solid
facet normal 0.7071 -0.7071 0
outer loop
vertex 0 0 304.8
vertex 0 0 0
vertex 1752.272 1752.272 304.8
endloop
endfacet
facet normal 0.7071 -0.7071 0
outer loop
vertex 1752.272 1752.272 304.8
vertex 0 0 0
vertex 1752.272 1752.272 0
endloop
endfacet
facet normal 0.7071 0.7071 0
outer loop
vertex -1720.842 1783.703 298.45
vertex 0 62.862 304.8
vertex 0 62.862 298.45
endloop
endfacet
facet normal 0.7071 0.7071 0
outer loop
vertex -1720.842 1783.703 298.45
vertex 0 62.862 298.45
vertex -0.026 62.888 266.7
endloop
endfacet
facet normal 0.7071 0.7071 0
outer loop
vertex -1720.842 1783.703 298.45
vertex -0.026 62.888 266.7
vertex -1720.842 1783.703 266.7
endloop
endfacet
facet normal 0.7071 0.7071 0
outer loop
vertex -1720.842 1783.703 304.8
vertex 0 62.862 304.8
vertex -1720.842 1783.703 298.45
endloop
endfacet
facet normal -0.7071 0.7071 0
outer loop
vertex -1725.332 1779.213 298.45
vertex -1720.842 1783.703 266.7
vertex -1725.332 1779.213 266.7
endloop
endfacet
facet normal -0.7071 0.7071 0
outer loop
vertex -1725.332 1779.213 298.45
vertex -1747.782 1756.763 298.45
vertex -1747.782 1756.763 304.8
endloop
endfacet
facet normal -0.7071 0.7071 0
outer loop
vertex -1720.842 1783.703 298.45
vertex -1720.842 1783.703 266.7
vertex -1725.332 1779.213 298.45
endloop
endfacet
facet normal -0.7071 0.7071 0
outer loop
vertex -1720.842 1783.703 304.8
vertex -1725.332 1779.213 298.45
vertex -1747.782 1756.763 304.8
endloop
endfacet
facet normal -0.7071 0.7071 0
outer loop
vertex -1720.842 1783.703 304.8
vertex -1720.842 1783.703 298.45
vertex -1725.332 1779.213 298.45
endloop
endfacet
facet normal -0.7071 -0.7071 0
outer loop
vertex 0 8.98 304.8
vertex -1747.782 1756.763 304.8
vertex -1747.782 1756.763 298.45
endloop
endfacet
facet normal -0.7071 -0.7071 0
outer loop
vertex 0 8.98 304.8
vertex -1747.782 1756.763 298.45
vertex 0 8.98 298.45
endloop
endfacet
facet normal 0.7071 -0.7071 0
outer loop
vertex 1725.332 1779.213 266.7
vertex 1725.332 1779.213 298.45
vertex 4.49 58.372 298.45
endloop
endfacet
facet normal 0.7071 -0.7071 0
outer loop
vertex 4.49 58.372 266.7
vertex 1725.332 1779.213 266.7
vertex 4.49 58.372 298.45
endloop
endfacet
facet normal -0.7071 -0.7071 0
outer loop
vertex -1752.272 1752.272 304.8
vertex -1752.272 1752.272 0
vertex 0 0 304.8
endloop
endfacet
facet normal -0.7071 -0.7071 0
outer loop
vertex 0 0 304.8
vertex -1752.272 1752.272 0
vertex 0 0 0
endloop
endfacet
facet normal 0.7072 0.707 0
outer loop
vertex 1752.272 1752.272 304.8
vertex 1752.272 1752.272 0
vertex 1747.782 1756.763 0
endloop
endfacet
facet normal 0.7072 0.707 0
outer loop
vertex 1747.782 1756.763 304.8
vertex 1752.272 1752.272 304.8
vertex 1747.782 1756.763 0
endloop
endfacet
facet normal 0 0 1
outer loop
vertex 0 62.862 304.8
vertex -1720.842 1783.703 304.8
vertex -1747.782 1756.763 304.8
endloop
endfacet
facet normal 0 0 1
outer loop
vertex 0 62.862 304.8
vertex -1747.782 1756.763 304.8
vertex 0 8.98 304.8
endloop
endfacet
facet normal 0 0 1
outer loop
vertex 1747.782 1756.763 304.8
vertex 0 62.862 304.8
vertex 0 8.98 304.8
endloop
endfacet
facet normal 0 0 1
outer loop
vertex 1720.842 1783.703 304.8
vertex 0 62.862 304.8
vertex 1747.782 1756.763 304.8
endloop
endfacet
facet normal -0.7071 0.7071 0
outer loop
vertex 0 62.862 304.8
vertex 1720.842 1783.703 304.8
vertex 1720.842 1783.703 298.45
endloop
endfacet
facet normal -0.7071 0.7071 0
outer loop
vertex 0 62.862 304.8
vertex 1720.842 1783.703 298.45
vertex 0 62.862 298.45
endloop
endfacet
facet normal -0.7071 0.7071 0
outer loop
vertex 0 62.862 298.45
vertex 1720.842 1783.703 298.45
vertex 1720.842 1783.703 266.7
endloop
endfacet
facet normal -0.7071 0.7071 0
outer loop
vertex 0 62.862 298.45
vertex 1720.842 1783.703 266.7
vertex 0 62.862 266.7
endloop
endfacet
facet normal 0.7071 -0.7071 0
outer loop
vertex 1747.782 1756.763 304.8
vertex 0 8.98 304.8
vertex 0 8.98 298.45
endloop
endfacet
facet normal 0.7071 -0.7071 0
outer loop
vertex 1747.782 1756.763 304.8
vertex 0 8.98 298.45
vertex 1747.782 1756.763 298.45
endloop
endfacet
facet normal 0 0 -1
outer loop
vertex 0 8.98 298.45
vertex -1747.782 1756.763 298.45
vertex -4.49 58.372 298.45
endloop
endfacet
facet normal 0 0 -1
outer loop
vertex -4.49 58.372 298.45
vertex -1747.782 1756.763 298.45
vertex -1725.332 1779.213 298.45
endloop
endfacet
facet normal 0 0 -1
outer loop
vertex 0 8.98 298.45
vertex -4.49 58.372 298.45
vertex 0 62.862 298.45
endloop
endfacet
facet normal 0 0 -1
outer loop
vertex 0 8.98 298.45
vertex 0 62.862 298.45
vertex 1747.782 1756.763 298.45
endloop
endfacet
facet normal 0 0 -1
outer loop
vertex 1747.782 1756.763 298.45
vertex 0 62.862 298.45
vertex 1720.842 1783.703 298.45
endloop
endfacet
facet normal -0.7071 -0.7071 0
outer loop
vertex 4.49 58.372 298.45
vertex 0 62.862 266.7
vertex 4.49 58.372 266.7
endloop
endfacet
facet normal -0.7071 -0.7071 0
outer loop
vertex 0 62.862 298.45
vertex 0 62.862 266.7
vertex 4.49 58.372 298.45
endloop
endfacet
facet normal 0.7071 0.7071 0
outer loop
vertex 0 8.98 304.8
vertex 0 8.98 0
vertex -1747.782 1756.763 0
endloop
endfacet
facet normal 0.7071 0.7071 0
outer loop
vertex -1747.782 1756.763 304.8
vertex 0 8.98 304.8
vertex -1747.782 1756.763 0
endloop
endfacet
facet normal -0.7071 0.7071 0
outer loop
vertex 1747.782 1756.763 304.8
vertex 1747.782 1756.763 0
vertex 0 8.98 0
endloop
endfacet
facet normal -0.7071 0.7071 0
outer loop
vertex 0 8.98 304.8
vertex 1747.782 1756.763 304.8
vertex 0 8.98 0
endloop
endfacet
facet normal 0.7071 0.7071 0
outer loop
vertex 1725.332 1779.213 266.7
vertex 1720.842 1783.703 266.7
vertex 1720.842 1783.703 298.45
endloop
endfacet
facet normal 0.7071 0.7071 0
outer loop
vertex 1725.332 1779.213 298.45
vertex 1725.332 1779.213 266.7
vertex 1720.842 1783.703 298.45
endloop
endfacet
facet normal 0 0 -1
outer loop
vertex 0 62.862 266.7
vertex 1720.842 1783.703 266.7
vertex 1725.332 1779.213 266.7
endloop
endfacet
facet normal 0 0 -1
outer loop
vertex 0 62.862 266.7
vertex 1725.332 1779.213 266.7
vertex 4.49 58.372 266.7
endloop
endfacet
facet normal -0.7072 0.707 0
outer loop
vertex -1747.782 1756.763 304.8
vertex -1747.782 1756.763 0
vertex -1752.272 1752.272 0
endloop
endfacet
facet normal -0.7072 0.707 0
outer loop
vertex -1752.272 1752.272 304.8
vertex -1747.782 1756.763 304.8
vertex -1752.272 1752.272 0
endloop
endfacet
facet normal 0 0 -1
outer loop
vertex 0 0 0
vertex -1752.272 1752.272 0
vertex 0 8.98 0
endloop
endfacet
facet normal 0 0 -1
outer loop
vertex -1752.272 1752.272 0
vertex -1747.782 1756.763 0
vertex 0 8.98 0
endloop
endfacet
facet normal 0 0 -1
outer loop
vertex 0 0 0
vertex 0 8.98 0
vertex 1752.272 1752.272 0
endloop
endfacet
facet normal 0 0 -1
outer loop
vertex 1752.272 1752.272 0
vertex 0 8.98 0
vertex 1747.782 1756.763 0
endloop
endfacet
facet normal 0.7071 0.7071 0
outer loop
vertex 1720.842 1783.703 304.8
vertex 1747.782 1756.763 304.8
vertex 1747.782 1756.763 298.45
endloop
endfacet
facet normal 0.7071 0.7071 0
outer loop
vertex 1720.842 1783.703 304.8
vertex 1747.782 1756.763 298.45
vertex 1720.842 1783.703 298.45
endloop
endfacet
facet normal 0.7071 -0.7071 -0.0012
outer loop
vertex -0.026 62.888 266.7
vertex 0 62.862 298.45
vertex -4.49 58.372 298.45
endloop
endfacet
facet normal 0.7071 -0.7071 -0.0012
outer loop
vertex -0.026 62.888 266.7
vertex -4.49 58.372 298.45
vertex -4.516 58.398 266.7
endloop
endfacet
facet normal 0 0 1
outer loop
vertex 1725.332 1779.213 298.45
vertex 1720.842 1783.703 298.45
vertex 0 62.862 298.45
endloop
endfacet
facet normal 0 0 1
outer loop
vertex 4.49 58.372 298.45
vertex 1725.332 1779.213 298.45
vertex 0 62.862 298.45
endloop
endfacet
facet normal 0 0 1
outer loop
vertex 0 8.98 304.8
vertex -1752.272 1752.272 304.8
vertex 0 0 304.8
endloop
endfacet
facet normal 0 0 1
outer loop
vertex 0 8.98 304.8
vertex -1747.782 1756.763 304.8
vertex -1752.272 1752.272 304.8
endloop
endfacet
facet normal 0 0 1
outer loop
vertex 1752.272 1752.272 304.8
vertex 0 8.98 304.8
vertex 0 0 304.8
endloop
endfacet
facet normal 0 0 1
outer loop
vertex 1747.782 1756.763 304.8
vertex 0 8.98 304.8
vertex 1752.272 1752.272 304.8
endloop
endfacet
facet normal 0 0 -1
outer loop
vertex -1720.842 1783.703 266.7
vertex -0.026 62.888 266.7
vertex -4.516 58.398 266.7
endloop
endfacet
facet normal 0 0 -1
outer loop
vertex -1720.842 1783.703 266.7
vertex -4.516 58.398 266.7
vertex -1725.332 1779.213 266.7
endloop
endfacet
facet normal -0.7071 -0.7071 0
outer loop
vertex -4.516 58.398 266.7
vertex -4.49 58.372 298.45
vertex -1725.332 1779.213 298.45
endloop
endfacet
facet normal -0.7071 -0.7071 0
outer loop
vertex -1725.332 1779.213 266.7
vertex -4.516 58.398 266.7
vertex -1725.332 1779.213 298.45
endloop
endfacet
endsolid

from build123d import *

# Parameters (mm, degrees)
F1_DEPTH = 304.8
F3_DEPTH = 6.35
F4_W     = 2433.6375
F4_H     = 31.75
F5_DEPTH = 6.35
F7_DEPTH = 6.35


with BuildPart() as f1:
    # F0 (on Top) → F1 (new body)
    with BuildSketch(Plane.XY):
        Polygon((-1752.2724756236, 1752.2724756236), (0, 0), (1752.2724756236, 1752.2724756236), (1747.7823475631, 1756.7626036842), (0, 8.9802561211), (-1747.7823475631, 1756.7626036842), align=None)
    extrude(amount=F1_DEPTH)


with BuildPart() as f3:
    # F2 (on face) → F3 (new body)
    with BuildSketch(Plane.XY.offset(304.8)):
        Polygon((-1720.8415791999, 1783.7033720474), (-1747.7823475631, 1756.7626036842), (0, 8.9802561211), (1747.7823475631, 1756.7626036842), (1720.8415791999, 1783.7033720474), (0, 62.8617928475), align=None)
    extrude(amount=-F3_DEPTH)

    # F6 (on face) → F7 (join)
    with BuildSketch(Plane(origin=(31.4308964237, 31.4308964237, 0), x_dir=(-0.7071067812, 0.7071067812, 0), z_dir=(0.7071067812, 0.7071067812, 0))):
        Polygon((2478.0875, 266.7), (2478.0875, 298.45), (44.45, 298.45), (44.4866344333, 266.7), align=None)
    extrude(amount=-F7_DEPTH)


with BuildPart() as f5:
    # F4 (on face) → F5 (new body)
    with BuildSketch(Plane(origin=(-31.4308964237, 31.4308964237, 0), x_dir=(-0.7071067812, -0.7071067812, 0), z_dir=(-0.7071067812, 0.7071067812, 0))):
        with Locations((-1261.26875, 282.575)):
            Rectangle(F4_W, F4_H)
    extrude(amount=-F5_DEPTH)


solid = Compound([f1.part, f3.part, f5.part])
